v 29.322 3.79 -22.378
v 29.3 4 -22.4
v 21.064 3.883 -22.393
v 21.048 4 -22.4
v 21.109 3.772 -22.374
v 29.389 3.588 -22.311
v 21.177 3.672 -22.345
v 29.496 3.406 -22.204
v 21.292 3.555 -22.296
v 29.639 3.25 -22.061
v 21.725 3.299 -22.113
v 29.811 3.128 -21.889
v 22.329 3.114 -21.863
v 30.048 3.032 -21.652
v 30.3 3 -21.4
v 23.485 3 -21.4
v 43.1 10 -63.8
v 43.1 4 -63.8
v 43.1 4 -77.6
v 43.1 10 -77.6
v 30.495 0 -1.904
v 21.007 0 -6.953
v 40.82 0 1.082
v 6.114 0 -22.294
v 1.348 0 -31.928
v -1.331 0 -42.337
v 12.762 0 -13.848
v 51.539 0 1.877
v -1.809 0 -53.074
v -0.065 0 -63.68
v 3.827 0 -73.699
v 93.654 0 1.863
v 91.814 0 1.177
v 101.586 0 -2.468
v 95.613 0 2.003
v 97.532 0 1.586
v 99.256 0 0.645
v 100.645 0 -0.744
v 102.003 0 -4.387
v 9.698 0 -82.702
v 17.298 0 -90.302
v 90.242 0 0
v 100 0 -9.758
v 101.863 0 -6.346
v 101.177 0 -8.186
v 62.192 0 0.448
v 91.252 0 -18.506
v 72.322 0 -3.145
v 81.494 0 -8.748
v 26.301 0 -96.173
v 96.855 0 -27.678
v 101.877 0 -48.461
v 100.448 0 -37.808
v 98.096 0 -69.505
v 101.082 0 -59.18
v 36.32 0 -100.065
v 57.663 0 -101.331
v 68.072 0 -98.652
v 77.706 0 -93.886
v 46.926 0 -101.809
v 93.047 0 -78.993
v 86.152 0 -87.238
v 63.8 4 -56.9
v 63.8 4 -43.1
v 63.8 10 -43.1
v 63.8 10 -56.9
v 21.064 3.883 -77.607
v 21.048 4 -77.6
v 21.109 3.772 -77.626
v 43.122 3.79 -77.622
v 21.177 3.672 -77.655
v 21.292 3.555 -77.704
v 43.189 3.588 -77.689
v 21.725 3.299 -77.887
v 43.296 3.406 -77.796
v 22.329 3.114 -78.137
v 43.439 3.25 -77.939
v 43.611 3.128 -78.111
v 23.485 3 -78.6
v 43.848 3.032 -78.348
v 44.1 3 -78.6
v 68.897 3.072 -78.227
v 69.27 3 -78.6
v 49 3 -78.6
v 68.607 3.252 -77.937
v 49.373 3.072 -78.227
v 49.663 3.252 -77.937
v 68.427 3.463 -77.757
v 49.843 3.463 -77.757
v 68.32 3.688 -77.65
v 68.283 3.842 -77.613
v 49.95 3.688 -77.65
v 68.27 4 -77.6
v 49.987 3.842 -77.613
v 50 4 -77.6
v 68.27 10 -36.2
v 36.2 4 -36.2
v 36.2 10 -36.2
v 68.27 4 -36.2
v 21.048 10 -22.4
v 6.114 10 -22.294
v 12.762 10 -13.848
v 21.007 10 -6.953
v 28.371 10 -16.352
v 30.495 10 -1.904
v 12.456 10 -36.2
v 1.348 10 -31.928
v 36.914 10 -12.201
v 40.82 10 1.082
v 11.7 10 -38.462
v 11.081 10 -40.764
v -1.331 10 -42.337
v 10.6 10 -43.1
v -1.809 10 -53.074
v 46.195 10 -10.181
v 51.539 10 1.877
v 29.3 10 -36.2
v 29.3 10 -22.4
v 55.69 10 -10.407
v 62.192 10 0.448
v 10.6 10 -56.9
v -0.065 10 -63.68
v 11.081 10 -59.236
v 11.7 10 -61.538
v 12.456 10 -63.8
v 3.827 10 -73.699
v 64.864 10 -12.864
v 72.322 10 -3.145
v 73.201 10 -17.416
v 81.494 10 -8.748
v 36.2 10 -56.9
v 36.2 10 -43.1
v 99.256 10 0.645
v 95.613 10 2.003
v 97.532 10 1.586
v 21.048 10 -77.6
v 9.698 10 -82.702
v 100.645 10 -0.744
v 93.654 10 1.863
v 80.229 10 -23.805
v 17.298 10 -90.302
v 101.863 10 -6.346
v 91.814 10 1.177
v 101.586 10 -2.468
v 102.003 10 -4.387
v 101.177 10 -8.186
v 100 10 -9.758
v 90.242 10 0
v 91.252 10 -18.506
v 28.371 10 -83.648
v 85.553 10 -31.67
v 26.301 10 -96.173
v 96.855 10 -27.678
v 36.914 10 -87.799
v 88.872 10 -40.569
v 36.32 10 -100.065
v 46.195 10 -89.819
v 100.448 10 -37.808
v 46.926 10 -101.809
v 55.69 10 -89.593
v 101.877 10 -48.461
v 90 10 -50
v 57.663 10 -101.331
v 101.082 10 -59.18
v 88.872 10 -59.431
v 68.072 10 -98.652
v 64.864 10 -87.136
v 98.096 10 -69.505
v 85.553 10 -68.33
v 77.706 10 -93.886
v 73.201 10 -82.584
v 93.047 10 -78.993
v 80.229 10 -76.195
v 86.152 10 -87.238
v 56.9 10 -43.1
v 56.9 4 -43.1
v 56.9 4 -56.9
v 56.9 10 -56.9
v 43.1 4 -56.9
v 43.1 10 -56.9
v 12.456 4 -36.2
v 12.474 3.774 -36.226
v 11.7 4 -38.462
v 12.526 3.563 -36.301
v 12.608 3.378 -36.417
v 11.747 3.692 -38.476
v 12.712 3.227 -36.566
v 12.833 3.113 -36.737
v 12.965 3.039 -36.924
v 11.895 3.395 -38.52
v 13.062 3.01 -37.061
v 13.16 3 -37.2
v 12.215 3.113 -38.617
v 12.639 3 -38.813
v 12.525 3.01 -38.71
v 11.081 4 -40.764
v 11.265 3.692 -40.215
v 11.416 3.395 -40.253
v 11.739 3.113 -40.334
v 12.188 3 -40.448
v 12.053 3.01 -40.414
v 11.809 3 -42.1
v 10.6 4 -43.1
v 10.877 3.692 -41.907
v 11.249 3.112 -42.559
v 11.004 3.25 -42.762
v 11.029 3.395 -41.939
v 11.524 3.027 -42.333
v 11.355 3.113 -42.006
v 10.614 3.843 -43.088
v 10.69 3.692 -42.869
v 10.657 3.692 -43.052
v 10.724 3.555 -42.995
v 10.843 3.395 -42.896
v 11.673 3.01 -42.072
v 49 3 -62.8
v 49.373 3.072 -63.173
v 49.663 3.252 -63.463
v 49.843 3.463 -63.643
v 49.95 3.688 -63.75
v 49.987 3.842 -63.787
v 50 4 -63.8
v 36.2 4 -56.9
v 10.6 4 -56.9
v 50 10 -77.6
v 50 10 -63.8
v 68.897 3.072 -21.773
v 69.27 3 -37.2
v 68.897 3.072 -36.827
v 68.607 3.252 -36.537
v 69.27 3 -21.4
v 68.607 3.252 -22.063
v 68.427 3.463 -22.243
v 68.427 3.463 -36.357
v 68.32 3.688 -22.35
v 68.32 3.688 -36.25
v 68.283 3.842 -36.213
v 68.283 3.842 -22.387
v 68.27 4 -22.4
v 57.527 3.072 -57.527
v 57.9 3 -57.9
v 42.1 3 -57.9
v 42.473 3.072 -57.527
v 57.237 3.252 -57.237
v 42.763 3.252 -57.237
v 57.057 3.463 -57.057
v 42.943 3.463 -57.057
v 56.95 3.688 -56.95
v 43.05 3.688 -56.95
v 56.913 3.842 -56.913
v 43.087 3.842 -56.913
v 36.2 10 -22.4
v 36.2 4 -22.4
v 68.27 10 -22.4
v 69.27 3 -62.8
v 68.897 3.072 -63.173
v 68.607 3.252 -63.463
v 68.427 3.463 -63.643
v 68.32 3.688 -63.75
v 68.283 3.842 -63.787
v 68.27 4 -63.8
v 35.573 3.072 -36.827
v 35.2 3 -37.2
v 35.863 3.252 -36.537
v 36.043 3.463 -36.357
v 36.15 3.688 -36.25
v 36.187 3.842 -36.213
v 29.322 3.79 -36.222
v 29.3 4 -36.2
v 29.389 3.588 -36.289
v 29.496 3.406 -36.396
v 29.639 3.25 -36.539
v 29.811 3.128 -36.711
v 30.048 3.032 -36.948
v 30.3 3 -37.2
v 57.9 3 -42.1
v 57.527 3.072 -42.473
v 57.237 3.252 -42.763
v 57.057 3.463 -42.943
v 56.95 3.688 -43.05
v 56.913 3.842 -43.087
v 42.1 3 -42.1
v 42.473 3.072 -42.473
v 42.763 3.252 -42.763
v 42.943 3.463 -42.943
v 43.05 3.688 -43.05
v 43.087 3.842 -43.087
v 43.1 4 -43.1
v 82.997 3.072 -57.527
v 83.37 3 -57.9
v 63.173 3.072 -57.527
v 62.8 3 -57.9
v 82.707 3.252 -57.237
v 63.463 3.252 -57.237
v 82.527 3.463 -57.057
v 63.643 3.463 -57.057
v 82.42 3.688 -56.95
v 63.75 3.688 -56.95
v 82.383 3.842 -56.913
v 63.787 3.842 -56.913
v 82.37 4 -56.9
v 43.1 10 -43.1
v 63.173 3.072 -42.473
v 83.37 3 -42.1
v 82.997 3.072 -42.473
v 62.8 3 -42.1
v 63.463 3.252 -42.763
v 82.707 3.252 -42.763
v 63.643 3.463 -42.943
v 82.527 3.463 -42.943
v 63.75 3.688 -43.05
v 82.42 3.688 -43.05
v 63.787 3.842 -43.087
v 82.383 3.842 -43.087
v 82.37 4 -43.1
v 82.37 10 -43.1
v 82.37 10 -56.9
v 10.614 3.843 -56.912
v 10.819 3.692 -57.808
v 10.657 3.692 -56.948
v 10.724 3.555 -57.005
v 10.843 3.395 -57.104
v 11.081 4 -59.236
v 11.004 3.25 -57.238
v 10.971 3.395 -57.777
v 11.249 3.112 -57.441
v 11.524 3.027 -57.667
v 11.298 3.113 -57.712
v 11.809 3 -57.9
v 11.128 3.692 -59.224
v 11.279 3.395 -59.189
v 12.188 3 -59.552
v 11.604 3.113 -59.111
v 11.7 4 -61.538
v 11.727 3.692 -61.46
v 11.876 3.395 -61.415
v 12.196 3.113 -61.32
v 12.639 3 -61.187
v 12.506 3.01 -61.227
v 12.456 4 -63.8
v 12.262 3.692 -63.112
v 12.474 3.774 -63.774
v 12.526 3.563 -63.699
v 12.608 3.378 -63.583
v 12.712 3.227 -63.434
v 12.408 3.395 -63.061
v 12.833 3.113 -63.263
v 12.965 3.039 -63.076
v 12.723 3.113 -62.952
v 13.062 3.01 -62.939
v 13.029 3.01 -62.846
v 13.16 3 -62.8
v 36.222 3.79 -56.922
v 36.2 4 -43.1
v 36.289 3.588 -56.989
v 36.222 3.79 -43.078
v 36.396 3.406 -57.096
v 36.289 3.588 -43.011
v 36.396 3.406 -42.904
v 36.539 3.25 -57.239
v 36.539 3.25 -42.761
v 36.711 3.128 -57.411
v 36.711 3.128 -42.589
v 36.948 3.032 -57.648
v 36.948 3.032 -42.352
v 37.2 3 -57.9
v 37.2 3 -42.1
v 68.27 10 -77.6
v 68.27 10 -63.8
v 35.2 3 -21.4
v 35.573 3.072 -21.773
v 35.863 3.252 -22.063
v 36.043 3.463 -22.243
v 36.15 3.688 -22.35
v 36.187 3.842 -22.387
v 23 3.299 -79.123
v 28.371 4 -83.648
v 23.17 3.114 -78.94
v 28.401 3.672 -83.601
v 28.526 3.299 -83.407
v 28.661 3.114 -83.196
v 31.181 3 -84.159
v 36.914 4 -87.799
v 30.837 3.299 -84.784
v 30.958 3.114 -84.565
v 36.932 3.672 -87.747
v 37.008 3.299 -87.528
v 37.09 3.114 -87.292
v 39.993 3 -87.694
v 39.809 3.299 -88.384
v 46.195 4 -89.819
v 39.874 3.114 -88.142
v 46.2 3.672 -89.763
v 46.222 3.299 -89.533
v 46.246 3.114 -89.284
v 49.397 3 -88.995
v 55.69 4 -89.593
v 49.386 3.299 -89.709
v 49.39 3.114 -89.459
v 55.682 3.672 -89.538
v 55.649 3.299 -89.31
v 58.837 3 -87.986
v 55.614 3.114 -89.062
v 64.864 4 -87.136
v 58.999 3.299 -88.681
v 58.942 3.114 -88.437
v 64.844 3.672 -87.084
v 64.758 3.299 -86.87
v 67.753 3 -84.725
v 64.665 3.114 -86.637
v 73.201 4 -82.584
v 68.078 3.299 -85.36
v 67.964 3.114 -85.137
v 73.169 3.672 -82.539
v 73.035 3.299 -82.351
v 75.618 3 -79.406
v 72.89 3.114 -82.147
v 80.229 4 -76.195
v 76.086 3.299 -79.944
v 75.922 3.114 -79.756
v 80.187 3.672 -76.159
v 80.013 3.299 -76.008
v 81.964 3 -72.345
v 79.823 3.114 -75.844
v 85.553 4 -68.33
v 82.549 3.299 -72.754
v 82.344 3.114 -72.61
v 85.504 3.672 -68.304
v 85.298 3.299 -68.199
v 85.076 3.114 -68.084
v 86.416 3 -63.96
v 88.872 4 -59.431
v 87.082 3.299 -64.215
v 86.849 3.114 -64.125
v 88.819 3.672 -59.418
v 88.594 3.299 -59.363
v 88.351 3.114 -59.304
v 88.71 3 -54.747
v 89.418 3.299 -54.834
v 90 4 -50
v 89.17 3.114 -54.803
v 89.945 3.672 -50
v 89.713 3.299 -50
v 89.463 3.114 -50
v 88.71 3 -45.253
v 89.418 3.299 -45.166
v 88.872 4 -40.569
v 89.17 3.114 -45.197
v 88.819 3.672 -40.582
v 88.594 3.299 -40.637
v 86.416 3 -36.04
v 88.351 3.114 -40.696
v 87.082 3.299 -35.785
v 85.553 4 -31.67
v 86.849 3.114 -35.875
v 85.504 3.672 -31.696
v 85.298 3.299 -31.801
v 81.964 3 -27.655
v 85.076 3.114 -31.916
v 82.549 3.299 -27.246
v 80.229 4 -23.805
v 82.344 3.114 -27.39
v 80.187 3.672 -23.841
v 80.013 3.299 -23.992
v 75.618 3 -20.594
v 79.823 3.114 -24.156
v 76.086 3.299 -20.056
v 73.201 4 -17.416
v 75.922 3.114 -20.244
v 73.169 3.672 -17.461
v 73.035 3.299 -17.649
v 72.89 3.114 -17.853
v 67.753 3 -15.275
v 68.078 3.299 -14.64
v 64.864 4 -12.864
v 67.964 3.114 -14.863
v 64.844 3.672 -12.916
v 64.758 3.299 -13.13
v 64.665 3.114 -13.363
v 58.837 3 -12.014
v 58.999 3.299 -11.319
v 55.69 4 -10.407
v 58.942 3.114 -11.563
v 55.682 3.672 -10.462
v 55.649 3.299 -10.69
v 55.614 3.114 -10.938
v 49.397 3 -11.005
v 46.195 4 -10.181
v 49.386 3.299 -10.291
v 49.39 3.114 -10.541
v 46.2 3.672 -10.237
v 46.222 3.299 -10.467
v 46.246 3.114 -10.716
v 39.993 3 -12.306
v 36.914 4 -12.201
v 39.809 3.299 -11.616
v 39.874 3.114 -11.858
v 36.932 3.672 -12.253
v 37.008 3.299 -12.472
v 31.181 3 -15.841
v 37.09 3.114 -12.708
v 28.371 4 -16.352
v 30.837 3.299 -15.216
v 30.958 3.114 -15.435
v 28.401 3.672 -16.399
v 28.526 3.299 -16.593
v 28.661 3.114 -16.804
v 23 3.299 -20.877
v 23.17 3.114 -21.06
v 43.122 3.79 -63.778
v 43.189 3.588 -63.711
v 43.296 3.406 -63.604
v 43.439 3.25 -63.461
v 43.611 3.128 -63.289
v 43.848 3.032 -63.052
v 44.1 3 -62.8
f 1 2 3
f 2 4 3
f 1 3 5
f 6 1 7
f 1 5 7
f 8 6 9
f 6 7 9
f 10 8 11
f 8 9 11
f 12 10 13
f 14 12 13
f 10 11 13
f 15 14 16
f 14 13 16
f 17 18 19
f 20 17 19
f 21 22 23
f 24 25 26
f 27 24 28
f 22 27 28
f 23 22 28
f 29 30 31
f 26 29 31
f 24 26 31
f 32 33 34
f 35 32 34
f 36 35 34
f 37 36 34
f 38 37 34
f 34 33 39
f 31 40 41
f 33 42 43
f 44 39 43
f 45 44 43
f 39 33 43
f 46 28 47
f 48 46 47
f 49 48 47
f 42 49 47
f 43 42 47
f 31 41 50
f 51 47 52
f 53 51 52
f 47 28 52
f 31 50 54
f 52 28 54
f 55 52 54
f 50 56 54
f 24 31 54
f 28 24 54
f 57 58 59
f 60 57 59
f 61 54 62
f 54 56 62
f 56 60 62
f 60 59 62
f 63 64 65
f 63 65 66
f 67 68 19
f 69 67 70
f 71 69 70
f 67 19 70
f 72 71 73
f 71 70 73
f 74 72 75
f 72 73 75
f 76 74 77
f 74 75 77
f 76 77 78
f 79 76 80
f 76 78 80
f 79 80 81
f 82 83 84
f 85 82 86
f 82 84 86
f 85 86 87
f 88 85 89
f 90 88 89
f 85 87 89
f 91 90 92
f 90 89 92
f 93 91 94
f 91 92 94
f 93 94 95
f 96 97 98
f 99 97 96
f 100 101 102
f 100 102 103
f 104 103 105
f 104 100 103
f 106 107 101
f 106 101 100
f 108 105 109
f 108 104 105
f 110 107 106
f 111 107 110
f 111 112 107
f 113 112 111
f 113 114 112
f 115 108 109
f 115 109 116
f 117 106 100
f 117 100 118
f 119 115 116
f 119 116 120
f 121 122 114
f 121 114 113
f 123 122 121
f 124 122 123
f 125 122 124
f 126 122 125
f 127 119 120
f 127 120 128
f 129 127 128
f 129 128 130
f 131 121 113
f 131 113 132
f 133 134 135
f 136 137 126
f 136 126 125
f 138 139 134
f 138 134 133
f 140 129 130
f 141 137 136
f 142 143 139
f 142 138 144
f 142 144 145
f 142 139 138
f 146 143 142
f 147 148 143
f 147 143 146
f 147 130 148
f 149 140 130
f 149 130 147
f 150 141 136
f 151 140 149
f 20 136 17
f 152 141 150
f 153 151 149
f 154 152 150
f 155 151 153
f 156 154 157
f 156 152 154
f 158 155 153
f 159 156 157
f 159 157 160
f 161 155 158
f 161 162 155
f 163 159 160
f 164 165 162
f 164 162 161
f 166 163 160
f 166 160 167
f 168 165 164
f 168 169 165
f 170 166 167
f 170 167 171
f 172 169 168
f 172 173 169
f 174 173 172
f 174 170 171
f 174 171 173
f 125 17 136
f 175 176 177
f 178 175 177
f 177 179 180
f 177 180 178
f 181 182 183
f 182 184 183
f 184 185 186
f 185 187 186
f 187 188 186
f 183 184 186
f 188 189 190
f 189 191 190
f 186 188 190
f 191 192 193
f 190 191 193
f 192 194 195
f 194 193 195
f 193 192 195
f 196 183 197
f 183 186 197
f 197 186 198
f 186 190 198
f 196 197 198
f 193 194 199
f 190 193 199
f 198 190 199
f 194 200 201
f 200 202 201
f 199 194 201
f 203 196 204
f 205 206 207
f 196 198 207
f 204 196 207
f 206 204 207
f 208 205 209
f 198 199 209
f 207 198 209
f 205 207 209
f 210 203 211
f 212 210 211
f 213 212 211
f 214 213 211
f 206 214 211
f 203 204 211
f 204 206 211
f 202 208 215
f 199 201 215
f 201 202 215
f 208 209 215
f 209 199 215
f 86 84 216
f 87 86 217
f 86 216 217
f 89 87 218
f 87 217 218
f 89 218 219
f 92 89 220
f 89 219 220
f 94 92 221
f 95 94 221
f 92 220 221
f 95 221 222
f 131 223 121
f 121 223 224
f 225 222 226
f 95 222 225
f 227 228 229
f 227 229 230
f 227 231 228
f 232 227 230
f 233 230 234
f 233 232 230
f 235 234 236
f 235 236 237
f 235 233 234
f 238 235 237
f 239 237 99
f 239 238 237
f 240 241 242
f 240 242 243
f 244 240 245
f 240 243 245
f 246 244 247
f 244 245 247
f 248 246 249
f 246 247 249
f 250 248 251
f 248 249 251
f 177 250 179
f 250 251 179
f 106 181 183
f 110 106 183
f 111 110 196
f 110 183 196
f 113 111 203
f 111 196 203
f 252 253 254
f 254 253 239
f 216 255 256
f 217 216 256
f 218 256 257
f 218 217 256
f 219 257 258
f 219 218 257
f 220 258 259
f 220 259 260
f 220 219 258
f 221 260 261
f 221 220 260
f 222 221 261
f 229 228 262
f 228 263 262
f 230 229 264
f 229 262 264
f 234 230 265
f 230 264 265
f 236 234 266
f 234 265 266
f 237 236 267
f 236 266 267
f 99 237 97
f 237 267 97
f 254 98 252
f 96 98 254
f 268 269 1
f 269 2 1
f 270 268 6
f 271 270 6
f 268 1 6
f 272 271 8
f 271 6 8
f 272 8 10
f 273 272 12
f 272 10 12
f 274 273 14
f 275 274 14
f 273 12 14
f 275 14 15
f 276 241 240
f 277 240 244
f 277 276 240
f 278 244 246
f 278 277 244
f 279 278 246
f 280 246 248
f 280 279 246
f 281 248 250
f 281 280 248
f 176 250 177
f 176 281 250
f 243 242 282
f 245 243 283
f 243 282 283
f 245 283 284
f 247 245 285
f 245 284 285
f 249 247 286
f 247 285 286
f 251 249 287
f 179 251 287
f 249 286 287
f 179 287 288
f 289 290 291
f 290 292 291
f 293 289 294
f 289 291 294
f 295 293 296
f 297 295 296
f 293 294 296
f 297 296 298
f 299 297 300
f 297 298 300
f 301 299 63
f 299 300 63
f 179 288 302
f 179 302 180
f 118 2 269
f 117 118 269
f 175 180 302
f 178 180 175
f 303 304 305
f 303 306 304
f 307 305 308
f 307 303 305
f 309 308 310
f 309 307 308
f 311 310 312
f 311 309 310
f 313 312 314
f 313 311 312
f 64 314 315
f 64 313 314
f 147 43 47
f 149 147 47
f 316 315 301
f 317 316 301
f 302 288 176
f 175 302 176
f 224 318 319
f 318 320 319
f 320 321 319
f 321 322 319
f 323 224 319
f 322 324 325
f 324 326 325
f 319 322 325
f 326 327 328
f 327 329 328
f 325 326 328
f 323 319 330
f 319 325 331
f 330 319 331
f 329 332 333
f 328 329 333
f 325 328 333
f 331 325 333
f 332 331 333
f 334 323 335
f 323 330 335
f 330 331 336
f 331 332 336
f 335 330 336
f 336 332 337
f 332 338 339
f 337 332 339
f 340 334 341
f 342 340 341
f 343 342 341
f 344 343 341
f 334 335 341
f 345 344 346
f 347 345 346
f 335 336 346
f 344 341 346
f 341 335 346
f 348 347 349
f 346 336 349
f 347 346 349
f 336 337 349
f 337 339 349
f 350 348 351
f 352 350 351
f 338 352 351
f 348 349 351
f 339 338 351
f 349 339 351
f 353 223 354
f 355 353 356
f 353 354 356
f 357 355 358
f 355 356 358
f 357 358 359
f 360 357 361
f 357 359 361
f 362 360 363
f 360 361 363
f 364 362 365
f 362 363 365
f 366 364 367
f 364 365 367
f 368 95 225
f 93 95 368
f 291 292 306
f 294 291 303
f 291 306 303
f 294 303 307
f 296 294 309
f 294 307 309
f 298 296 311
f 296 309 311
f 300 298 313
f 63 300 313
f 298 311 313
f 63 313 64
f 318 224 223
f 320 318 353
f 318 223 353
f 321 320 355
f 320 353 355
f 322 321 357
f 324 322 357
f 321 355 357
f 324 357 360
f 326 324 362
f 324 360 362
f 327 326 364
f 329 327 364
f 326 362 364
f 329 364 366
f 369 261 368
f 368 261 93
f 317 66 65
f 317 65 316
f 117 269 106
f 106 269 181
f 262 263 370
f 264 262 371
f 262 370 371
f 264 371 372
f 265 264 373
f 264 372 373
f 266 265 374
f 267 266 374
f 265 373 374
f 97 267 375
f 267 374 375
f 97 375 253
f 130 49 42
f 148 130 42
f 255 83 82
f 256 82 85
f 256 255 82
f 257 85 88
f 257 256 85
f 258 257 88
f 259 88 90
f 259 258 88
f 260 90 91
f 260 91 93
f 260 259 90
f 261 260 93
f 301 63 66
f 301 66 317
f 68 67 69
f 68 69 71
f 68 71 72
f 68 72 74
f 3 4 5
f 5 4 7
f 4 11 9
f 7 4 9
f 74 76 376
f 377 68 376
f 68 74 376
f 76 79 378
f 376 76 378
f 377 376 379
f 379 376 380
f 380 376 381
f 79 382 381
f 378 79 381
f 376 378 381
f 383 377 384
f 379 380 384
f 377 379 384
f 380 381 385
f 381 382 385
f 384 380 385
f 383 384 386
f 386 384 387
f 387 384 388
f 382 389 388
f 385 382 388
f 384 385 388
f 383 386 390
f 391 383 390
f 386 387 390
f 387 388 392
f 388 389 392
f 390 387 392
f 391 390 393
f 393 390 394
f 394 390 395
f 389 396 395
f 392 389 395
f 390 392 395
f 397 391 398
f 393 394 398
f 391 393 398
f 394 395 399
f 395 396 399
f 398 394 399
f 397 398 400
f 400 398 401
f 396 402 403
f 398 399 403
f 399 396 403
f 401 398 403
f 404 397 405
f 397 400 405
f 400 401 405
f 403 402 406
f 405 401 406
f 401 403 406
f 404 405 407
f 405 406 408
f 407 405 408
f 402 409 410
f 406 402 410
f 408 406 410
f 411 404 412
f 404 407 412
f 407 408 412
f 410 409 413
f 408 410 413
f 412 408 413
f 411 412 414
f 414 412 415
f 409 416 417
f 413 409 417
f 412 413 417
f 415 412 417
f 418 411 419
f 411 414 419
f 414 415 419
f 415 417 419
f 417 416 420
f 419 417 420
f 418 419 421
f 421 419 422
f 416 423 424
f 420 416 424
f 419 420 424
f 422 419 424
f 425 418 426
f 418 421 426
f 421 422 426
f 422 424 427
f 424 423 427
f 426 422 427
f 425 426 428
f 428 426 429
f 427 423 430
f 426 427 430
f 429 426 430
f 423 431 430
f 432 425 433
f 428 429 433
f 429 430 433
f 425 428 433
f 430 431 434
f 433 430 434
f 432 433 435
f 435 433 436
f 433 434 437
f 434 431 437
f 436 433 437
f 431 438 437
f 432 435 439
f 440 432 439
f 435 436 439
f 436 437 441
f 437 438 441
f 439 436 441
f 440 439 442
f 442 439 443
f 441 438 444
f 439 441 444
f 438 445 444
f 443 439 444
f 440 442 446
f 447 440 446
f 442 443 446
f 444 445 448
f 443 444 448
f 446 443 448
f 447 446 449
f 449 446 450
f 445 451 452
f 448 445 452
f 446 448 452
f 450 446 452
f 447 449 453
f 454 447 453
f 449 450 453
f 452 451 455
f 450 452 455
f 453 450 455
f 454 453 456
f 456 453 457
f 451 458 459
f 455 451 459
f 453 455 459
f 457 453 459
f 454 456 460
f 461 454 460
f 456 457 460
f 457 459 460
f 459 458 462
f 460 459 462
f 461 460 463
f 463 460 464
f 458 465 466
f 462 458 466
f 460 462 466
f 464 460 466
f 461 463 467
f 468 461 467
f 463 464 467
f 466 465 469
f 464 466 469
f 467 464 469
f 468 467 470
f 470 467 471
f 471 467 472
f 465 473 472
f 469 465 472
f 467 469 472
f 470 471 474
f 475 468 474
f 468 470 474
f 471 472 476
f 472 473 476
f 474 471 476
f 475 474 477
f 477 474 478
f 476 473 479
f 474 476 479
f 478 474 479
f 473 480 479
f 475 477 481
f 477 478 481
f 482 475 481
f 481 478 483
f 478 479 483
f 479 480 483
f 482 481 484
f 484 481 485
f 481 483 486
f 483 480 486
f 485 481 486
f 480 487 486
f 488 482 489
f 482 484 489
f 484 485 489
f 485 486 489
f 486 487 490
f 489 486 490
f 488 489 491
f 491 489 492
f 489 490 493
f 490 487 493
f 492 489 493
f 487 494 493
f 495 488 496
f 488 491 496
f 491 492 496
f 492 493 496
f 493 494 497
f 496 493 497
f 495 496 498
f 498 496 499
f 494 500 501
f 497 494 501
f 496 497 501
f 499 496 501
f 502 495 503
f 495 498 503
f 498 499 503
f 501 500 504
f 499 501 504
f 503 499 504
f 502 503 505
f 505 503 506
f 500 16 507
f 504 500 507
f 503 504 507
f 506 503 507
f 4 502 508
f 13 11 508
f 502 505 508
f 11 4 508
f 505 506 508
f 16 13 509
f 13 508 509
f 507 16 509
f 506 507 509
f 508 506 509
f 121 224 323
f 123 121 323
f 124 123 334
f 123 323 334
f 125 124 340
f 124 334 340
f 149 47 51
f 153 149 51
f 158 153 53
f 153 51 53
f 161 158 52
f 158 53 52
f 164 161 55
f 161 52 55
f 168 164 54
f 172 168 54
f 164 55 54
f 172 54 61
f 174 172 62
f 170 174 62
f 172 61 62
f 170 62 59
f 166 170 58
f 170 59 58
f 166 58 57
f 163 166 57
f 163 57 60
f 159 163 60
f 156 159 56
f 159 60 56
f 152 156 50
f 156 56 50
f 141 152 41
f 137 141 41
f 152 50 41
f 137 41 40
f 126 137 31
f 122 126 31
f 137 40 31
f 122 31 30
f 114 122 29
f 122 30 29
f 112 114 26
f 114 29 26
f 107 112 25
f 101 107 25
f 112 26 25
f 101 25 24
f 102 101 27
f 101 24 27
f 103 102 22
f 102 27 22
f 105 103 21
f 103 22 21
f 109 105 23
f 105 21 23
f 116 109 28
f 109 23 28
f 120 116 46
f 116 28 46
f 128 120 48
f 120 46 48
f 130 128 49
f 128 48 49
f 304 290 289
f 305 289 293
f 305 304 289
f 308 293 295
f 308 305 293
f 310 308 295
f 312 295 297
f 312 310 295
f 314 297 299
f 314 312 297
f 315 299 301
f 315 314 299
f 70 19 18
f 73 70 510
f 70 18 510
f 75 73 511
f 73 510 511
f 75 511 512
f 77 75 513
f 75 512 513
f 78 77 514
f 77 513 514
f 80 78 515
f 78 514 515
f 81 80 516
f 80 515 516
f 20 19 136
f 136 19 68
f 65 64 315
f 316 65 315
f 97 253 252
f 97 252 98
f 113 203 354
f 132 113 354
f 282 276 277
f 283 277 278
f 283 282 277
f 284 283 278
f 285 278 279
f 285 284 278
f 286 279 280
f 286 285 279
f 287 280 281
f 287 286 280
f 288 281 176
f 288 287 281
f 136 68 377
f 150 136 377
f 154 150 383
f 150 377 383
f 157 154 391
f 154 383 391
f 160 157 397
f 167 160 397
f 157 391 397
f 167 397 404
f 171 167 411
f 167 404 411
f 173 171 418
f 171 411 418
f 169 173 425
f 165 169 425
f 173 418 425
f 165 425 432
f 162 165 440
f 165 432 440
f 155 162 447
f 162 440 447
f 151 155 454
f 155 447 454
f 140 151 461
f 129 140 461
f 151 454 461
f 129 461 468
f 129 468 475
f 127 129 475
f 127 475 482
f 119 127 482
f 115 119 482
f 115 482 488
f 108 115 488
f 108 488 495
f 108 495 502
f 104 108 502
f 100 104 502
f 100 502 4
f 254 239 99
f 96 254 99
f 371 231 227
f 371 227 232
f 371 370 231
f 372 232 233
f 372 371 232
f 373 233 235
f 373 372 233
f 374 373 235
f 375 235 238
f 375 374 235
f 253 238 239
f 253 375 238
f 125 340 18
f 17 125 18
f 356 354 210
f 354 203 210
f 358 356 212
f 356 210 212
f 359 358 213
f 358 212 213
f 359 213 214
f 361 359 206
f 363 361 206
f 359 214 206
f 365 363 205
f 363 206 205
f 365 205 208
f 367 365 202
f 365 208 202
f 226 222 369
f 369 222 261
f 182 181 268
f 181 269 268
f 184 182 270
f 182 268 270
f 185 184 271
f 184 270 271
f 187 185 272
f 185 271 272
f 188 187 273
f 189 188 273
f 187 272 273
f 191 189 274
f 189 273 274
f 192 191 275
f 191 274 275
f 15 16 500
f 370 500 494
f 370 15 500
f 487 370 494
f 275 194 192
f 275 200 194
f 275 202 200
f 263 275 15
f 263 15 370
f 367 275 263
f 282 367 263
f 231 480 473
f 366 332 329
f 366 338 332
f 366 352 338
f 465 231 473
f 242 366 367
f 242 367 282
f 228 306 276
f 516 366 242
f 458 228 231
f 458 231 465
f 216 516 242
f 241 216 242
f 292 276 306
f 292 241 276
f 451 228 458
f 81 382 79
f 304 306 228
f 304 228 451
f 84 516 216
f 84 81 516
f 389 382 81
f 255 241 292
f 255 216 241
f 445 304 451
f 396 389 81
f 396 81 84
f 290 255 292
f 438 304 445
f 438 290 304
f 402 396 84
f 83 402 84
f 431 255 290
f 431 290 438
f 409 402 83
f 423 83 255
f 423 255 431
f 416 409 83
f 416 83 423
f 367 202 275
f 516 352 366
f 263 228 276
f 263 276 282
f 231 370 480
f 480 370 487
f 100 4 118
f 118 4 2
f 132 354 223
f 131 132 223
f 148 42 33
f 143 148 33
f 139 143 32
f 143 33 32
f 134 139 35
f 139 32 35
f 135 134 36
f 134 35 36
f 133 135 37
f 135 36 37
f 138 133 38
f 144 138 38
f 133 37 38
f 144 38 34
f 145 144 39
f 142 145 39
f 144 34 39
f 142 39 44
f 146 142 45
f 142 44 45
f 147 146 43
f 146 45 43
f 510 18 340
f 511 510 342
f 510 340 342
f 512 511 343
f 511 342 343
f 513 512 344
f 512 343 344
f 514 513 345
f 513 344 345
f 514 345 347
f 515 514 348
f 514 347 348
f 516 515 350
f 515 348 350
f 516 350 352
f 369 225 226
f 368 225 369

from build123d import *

# Parameters (mm, degrees)
BOSS_EXTRUDE12_DEPTH = 3
SKETCH1_16_W         = 18.27
SKETCH1_16_H         = 13.8
SKETCH1_16_W_2       = 18.57
SKETCH1_16_W_3       = 32.07
BOSS_EXTRUDE13_DEPTH = 10
SKETCH1_17_W         = 13.8
SKETCH1_17_H         = 13.8
BOSS_EXTRUDE14_DEPTH = 10
FILLET1_R            = 1


with BuildPart() as part:
    # Sketch1 → Boss-Extrude12 (new body)
    with BuildSketch(Plane(origin=(0, 0, 0), x_dir=(1, 0, 0), z_dir=(0, 1, 0))):
        with BuildLine():
            Line((81.494030169, 8.747896251), (90.24192642, 0))
            ThreePointArc((90.24192642, 0), (100, 0), (100, 9.75807358))
            Line((100, 9.75807358), (91.252103749, 18.505969831))
            ThreePointArc((91.252103749, 18.505969831), (13.301158056, 86.698841944), (81.494030169, 8.747896251))
        make_face()
    extrude(amount=BOSS_EXTRUDE12_DEPTH)

    # Sketch1<16> → Boss-Extrude13 (add)
    # profile 1 of 4: a face of its own
    with BuildSketch(Plane(origin=(0, 0, 0), x_dir=(1, 0, 0), z_dir=(0, 1, 0))):
        with BuildLine():
            Line((81.494030169, 8.747896251), (90.24192642, 0))
            ThreePointArc((90.24192642, 0), (100, 0), (100, 9.75807358))
            Line((100, 9.75807358), (91.252103749, 18.505969831))
            ThreePointArc((91.252103749, 18.505969831), (13.301158056, 86.698841944), (81.494030169, 8.747896251))
        make_face()
        with BuildLine():
            Line((21.047625313, 22.4), (29.3, 22.4))
            Line((29.3, 22.4), (29.3, 36.2))
            Line((29.3, 36.2), (12.455892606, 36.2))
            ThreePointArc((12.455892606, 36.2), (11.37337625, 39.608467983), (10.599619291, 43.1))
            Line((10.599619291, 43.1), (36.2, 43.1))
            Line((36.2, 43.1), (36.2, 56.9))
            Line((36.2, 56.9), (10.599619291, 56.9))
            ThreePointArc((10.599619291, 56.9), (11.37337625, 60.391532017), (12.455892606, 63.8))
            Line((12.455892606, 63.8), (43.1, 63.8))
            Line((43.1, 63.8), (43.1, 77.6))
            Line((43.1, 77.6), (21.047625313, 77.6))
            ThreePointArc((21.047625313, 77.6), (90, 50), (21.047625313, 22.4))
        make_face(mode=Mode.SUBTRACT)
    # profile 2 of 4: a face of its own
    with BuildSketch(Plane(origin=(0, 0, 0), x_dir=(1, 0, 0), z_dir=(0, 1, 0))):
        with Locations((59.135, 70.7)):
            Rectangle(SKETCH1_16_W, SKETCH1_16_H)
    # profile 3 of 4: a face of its own
    with BuildSketch(Plane(origin=(0, 0, 0), x_dir=(1, 0, 0), z_dir=(0, 1, 0))):
        with Locations((73.085, 50)):
            Rectangle(SKETCH1_16_W_2, SKETCH1_16_H)
    # profile 4 of 4: a face of its own
    with BuildSketch(Plane(origin=(0, 0, 0), x_dir=(1, 0, 0), z_dir=(0, 1, 0))):
        with Locations((52.235, 29.3)):
            Rectangle(SKETCH1_16_W_3, SKETCH1_16_H)
    extrude(amount=BOSS_EXTRUDE13_DEPTH)

    # Sketch1<17> → Boss-Extrude14 (add)
    with BuildSketch(Plane(origin=(0, 0, 0), x_dir=(1, 0, 0), z_dir=(0, 1, 0))):
        with Locations((50, 50)):
            Rectangle(SKETCH1_17_W, SKETCH1_17_H)
    extrude(amount=BOSS_EXTRUDE14_DEPTH)

    # Fillet1
    fillet1_edges = [part.edges().sort_by_distance(p)[0] for p in [
        (90, 3, -50),
        (36.2, 3, -29.3),
        (52.235, 3, -22.4),
        (50, 3, -70.7),
        (59.135, 3, -63.8),
        (43.1, 3, -50),
        (50, 3, -43.1),
        (63.8, 3, -50),
        (73.085, 3, -43.1),
        (50, 3, -56.9),
        (73.085, 3, -56.9),
        (56.9, 3, -50),
        (52.235, 3, -36.2),
        (68.27, 3, -29.3),
        (82.37, 3, -50),
        (68.27, 3, -70.7),
        (59.135, 3, -77.6),
        (32.073812657, 3, -77.6),
        (43.1, 3, -70.7),
        (27.777946303, 3, -63.8),
        (11.37337625, 3, -60.391532017),
        (23.399809646, 3, -56.9),
        (36.2, 3, -50),
        (23.399809646, 3, -43.1),
        (11.37337625, 3, -39.608467983),
        (20.877946303, 3, -36.2),
        (29.3, 3, -29.3),
        (25.173812657, 3, -22.4),
    ]]
    fillet(fillet1_edges, radius=FILLET1_R)


solid = part.part
